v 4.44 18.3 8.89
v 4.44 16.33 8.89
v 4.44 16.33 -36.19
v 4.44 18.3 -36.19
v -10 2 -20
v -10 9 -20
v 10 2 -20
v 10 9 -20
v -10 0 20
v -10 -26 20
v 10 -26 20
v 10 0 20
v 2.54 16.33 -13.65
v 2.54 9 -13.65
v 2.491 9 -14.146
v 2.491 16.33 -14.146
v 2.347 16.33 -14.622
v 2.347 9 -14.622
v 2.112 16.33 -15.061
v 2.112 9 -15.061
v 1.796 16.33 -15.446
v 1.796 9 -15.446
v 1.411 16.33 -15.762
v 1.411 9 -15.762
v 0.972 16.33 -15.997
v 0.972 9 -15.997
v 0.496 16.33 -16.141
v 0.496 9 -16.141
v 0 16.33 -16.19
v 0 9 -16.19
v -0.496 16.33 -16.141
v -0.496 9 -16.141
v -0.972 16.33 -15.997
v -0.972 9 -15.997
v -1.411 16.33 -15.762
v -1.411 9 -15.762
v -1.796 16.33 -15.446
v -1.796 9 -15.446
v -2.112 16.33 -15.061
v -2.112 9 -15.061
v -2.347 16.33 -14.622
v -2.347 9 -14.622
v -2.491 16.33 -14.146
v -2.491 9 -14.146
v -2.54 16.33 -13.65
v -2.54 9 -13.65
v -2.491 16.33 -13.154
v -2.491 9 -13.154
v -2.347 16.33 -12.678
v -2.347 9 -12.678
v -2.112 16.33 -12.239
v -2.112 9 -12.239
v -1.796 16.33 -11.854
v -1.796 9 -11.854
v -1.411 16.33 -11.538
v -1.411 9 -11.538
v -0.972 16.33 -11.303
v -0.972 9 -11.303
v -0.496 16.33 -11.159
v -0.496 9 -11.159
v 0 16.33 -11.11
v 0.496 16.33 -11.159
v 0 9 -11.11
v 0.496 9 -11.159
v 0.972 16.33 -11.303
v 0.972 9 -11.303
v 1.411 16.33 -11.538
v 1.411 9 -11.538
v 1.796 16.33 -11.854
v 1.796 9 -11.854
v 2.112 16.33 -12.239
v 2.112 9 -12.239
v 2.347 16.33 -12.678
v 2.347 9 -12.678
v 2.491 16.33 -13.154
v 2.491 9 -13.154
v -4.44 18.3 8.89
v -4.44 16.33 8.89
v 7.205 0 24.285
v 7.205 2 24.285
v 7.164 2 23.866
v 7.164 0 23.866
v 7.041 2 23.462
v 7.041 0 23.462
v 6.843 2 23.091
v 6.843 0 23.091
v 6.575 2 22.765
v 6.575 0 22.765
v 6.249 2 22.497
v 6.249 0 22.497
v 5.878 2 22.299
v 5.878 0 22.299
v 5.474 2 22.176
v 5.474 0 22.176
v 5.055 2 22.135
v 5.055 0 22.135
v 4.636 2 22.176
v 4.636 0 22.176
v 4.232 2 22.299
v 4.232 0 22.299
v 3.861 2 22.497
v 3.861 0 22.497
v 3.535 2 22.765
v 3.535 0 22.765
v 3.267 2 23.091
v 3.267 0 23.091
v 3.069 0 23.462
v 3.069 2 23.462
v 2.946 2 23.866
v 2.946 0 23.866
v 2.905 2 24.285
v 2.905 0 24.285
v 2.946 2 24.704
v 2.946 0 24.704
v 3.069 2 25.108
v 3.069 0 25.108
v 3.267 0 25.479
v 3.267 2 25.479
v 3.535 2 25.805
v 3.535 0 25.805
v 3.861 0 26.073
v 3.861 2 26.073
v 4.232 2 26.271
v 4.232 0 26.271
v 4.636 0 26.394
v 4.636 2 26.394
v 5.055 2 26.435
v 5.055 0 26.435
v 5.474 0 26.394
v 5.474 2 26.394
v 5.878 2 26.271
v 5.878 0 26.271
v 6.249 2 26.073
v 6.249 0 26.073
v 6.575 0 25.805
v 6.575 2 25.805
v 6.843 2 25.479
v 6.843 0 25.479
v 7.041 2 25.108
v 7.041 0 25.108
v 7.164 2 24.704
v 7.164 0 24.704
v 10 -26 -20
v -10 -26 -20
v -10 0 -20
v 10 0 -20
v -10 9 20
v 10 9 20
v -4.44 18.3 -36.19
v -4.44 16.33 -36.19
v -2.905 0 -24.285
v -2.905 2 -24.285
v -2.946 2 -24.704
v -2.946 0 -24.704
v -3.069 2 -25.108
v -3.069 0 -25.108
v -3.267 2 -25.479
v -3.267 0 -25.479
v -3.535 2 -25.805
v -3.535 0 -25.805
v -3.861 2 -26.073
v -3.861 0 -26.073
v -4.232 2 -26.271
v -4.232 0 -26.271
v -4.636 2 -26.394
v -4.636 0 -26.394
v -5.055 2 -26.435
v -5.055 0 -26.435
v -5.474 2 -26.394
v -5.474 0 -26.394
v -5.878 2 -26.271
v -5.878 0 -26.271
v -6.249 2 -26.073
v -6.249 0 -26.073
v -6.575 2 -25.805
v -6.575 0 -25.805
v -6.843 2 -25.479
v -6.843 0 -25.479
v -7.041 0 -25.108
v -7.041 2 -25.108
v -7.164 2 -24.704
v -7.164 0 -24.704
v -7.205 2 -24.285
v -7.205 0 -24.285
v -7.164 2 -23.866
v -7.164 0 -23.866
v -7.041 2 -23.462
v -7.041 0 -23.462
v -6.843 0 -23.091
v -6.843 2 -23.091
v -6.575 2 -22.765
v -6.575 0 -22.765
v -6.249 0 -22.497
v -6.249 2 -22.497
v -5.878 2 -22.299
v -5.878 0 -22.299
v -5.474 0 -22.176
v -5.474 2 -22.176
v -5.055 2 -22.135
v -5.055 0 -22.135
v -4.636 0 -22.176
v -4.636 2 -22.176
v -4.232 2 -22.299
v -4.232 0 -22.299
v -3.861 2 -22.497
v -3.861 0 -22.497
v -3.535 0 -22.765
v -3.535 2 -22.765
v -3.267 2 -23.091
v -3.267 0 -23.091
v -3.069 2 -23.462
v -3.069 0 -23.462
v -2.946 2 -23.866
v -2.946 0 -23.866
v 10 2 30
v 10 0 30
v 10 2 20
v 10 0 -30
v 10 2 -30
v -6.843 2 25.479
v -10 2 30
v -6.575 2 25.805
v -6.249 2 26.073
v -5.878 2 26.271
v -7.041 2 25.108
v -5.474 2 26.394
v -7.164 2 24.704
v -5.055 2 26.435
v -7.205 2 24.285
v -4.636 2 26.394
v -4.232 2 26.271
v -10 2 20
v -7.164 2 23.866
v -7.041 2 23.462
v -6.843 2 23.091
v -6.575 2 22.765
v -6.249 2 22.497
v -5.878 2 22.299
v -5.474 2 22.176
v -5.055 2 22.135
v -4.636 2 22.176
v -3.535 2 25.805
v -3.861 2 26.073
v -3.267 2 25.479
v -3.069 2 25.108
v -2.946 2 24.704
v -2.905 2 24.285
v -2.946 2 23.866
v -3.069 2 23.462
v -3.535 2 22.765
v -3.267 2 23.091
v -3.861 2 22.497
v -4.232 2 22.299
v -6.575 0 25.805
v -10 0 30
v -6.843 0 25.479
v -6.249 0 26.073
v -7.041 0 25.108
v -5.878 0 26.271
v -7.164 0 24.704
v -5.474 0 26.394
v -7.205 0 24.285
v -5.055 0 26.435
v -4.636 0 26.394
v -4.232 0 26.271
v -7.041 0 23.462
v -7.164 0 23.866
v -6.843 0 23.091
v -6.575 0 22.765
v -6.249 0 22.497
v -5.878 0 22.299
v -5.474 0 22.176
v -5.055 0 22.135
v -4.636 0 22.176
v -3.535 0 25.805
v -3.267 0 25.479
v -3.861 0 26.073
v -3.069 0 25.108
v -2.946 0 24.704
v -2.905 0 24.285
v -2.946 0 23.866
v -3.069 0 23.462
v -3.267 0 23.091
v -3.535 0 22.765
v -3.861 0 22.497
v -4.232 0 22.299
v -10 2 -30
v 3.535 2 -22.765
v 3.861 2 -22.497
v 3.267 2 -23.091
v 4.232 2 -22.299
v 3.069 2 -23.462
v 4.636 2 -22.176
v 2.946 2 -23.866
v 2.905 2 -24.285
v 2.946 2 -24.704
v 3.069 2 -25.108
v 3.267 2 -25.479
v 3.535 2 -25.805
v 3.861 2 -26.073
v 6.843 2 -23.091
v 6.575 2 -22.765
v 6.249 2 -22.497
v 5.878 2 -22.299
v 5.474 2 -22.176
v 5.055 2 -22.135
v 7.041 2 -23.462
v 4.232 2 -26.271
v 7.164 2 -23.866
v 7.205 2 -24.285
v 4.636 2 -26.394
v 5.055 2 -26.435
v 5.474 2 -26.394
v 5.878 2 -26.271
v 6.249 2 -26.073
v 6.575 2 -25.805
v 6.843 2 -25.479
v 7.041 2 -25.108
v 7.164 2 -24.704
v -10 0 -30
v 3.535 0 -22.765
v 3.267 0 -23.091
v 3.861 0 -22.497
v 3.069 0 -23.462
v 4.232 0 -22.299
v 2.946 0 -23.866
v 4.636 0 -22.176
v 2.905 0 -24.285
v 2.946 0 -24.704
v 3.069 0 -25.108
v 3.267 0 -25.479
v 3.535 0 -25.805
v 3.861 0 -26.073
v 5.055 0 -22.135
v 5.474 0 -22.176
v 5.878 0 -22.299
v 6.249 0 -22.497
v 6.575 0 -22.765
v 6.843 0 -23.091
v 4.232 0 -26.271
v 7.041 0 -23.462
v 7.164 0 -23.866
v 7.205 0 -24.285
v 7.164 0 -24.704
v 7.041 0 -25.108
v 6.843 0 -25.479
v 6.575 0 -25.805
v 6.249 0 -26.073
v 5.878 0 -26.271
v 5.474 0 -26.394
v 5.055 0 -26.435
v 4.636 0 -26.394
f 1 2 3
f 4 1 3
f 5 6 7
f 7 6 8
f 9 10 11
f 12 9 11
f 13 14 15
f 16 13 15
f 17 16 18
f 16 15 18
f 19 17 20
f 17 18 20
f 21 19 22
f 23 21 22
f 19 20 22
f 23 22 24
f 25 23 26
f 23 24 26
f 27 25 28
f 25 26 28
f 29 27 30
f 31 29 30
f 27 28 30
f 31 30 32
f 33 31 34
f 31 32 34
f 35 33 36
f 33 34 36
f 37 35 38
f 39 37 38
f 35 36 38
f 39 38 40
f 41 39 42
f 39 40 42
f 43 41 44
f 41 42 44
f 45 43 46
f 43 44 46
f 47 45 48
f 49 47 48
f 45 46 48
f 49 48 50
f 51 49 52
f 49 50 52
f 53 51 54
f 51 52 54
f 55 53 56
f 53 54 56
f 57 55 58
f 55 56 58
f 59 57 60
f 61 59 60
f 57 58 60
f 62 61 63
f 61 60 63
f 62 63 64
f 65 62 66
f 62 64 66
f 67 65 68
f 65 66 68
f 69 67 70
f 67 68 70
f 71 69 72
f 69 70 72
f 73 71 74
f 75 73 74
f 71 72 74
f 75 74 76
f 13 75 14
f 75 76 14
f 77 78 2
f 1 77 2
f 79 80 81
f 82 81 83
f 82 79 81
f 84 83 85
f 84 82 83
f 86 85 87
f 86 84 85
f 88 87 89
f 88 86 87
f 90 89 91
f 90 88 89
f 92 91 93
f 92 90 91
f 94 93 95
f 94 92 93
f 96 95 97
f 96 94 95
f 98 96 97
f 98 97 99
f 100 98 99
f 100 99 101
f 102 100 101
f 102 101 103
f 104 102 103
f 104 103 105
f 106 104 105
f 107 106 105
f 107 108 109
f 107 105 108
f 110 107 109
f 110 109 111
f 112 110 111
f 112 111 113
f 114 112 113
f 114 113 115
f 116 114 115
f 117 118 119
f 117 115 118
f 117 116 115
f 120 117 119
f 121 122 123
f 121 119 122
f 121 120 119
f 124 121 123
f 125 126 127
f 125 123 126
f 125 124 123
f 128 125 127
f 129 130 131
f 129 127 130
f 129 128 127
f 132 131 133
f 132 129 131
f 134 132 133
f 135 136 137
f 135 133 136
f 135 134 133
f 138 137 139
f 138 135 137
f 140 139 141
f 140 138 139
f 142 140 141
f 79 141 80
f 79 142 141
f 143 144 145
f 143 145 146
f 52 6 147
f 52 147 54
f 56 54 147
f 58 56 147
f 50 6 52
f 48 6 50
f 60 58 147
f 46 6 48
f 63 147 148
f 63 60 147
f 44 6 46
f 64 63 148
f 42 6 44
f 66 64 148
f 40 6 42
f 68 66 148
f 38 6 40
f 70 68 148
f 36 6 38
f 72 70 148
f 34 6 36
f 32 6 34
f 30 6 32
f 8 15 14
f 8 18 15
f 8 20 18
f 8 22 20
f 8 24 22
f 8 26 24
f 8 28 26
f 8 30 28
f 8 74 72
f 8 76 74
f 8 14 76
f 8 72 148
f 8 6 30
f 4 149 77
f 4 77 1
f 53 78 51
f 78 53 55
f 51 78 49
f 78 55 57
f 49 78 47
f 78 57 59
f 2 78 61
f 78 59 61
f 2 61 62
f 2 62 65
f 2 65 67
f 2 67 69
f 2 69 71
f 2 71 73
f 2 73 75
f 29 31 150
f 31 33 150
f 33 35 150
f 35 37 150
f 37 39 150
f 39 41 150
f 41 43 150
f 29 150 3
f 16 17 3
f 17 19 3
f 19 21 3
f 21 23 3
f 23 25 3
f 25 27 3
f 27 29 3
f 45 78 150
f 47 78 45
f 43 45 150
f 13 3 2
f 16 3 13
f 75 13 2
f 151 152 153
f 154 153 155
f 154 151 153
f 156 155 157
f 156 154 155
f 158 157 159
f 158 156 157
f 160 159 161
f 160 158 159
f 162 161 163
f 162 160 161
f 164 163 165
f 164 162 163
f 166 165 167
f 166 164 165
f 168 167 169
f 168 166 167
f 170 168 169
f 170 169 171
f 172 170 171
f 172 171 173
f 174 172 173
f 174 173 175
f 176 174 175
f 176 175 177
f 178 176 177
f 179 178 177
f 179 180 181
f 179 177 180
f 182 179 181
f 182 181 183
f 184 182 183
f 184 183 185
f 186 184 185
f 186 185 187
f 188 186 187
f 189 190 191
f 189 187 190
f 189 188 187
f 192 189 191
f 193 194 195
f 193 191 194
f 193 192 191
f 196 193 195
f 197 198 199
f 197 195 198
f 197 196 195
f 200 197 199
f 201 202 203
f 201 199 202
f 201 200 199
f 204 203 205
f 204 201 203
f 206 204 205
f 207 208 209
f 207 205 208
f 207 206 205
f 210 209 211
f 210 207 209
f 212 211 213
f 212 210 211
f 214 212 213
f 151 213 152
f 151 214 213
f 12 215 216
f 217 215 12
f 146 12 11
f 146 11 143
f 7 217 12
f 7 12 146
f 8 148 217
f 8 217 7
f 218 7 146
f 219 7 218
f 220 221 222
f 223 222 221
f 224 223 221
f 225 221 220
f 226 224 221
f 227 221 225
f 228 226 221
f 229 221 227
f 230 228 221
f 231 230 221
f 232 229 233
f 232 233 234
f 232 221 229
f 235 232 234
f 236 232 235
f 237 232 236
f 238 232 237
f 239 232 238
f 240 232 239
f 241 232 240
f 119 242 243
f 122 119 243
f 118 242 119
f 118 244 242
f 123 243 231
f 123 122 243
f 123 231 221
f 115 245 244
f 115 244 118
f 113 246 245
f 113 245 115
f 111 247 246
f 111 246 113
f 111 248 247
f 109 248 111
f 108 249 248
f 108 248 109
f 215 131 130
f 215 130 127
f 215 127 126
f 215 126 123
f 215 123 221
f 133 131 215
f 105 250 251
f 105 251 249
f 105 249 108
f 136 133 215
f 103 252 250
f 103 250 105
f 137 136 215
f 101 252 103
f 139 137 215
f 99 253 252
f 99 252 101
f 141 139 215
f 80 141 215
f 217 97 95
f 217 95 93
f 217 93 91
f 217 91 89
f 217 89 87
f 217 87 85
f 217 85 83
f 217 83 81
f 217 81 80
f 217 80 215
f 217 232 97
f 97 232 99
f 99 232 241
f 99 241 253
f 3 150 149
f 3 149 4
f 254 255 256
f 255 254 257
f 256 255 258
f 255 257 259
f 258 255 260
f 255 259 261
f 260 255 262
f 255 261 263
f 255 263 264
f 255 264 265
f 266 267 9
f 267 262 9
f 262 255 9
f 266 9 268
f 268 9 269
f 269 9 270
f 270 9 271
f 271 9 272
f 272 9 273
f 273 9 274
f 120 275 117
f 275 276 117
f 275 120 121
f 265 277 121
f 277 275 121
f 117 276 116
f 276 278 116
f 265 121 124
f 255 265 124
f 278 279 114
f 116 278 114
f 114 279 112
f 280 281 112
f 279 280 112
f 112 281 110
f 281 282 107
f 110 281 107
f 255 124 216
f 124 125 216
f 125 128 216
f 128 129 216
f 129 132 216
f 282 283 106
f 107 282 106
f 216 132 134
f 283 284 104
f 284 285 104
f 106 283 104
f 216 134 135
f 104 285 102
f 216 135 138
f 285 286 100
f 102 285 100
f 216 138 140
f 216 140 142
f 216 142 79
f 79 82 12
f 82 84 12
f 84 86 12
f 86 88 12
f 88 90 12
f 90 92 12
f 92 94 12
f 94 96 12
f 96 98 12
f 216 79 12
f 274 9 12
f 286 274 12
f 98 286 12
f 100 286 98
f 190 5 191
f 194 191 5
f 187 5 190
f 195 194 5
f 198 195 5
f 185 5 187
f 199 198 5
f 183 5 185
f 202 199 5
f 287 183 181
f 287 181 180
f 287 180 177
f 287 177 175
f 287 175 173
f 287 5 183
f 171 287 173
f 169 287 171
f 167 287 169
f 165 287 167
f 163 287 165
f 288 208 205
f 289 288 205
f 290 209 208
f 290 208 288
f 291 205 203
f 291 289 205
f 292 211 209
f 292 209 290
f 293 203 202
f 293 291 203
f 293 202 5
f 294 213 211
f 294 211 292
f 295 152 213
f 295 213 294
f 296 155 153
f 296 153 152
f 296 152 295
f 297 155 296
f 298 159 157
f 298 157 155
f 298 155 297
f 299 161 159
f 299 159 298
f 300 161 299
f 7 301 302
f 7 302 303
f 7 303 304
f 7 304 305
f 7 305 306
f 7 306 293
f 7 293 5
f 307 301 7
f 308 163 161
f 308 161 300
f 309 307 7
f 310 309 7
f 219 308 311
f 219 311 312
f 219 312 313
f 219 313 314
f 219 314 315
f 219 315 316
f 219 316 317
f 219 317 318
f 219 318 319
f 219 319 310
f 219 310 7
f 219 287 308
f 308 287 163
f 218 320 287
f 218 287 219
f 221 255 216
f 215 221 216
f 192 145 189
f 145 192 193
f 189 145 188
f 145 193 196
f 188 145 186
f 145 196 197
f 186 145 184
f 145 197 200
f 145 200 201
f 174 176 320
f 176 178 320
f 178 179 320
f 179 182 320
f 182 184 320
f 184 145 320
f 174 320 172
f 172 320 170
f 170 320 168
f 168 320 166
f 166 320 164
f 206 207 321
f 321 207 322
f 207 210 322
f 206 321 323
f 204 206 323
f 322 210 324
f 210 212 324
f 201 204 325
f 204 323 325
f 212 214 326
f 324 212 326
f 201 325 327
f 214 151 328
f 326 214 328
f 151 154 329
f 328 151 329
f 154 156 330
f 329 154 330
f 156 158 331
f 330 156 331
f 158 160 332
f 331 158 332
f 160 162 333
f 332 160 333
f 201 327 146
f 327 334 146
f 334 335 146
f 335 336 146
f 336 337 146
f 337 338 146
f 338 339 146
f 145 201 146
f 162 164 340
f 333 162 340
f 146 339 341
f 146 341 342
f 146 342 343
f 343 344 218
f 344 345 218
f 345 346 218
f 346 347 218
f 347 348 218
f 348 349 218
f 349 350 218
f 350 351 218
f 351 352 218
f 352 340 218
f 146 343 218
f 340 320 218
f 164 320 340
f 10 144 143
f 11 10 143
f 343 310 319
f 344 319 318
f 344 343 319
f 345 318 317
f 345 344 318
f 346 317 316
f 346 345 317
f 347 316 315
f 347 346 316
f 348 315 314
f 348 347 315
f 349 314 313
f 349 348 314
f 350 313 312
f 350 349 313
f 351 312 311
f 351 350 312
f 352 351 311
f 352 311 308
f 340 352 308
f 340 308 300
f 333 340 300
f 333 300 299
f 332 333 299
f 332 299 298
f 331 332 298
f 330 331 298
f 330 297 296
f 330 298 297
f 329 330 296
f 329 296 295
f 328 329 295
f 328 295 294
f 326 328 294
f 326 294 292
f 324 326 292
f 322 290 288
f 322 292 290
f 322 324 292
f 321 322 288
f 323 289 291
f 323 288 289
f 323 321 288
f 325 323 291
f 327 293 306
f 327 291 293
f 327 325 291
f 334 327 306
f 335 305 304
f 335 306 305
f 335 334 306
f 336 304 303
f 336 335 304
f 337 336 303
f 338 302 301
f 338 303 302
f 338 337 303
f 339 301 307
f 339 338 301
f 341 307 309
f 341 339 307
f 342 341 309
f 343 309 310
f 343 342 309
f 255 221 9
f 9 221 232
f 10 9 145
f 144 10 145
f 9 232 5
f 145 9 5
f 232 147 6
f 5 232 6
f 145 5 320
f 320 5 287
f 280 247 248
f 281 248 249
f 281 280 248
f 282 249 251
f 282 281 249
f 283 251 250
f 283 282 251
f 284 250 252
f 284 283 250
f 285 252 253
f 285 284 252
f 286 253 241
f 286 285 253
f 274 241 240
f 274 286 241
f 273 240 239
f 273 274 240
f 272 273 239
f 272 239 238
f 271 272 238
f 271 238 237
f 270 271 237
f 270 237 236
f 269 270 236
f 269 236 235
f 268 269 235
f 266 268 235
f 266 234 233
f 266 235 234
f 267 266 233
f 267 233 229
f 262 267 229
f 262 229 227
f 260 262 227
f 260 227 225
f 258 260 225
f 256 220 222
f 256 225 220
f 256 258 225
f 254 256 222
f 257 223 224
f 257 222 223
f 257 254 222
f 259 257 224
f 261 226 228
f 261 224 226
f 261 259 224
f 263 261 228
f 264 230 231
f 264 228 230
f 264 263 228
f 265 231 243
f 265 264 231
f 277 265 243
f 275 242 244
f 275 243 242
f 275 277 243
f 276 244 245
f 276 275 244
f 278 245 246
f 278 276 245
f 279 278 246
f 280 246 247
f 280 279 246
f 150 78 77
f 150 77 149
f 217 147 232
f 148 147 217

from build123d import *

# Parameters (mm, degrees)
BOSS_EXTRUDE1_DEPTH      = 9
BOSS_EXTRUDE1_DEPTH_BACK = 26
SKETCH1_W                = 20
SKETCH1_H                = 40
SKETCH2_R                = 2.54
BOSS_EXTRUDE2_DEPTH      = 7.33
SKETCH3_W                = 8.88
SKETCH3_H                = 45.08
BOSS_EXTRUDE3_DEPTH      = 1.97
SKETCH6_W                = 20
SKETCH6_H                = 10
BOSS_EXTRUDE5_DEPTH      = 2
SKETCH8_R                = 2.15
CUT_EXTRUDE1_DEPTH       = 5.159375


with BuildPart() as part:
    # Sketch1 → Boss-Extrude1 (new, two sides: drawn at the far end of the back side and taken through both)
    with BuildSketch(Plane(origin=(0, 0, 0), x_dir=(1, 0, 0), z_dir=(0, 1, 0)).offset(-BOSS_EXTRUDE1_DEPTH_BACK)):
        Rectangle(SKETCH1_W, SKETCH1_H)
    extrude(amount=BOSS_EXTRUDE1_DEPTH + BOSS_EXTRUDE1_DEPTH_BACK)

    # Sketch2 → Boss-Extrude2 (add)
    with BuildSketch(Plane(origin=(0, 9, 0), x_dir=(1, 0, 0), z_dir=(0, 1, 0))):
        with Locations((0, 13.65)):
            Circle(SKETCH2_R)
    extrude(amount=BOSS_EXTRUDE2_DEPTH)

    # Sketch3 → Boss-Extrude3 (add)
    with BuildSketch(Plane(origin=(0, 16.33, 0), x_dir=(1, 0, 0), z_dir=(0, 1, 0))):
        with Locations((0, 13.65)):
            Rectangle(SKETCH3_W, SKETCH3_H)
    extrude(amount=BOSS_EXTRUDE3_DEPTH)

    # Sketch6 → Boss-Extrude5 (add)
    with BuildSketch(Plane(origin=(0, 0, 0), x_dir=(1, 0, 0), z_dir=(0, 1, 0))):
        with Locations((0, -25)):
            Rectangle(SKETCH6_W, SKETCH6_H)
        with Locations((0, 25)):
            Rectangle(SKETCH6_W, SKETCH6_H)
    extrude(amount=BOSS_EXTRUDE5_DEPTH)

    # Sketch8 → Cut-Extrude1 (cut)
    with BuildSketch(Plane(origin=(0, 0, 0), x_dir=(1, 0, 0), z_dir=(0, 1, 0))):
        with Locations((5.055, -24.285)):
            Circle(SKETCH8_R)
        with Locations((-5.055, -24.285)):
            Circle(SKETCH8_R)
        with Locations((5.055, 24.285)):
            Circle(SKETCH8_R)
        with Locations((-5.055, 24.285)):
            Circle(SKETCH8_R)
    extrude(amount=CUT_EXTRUDE1_DEPTH, mode=Mode.SUBTRACT)


solid = part.part
